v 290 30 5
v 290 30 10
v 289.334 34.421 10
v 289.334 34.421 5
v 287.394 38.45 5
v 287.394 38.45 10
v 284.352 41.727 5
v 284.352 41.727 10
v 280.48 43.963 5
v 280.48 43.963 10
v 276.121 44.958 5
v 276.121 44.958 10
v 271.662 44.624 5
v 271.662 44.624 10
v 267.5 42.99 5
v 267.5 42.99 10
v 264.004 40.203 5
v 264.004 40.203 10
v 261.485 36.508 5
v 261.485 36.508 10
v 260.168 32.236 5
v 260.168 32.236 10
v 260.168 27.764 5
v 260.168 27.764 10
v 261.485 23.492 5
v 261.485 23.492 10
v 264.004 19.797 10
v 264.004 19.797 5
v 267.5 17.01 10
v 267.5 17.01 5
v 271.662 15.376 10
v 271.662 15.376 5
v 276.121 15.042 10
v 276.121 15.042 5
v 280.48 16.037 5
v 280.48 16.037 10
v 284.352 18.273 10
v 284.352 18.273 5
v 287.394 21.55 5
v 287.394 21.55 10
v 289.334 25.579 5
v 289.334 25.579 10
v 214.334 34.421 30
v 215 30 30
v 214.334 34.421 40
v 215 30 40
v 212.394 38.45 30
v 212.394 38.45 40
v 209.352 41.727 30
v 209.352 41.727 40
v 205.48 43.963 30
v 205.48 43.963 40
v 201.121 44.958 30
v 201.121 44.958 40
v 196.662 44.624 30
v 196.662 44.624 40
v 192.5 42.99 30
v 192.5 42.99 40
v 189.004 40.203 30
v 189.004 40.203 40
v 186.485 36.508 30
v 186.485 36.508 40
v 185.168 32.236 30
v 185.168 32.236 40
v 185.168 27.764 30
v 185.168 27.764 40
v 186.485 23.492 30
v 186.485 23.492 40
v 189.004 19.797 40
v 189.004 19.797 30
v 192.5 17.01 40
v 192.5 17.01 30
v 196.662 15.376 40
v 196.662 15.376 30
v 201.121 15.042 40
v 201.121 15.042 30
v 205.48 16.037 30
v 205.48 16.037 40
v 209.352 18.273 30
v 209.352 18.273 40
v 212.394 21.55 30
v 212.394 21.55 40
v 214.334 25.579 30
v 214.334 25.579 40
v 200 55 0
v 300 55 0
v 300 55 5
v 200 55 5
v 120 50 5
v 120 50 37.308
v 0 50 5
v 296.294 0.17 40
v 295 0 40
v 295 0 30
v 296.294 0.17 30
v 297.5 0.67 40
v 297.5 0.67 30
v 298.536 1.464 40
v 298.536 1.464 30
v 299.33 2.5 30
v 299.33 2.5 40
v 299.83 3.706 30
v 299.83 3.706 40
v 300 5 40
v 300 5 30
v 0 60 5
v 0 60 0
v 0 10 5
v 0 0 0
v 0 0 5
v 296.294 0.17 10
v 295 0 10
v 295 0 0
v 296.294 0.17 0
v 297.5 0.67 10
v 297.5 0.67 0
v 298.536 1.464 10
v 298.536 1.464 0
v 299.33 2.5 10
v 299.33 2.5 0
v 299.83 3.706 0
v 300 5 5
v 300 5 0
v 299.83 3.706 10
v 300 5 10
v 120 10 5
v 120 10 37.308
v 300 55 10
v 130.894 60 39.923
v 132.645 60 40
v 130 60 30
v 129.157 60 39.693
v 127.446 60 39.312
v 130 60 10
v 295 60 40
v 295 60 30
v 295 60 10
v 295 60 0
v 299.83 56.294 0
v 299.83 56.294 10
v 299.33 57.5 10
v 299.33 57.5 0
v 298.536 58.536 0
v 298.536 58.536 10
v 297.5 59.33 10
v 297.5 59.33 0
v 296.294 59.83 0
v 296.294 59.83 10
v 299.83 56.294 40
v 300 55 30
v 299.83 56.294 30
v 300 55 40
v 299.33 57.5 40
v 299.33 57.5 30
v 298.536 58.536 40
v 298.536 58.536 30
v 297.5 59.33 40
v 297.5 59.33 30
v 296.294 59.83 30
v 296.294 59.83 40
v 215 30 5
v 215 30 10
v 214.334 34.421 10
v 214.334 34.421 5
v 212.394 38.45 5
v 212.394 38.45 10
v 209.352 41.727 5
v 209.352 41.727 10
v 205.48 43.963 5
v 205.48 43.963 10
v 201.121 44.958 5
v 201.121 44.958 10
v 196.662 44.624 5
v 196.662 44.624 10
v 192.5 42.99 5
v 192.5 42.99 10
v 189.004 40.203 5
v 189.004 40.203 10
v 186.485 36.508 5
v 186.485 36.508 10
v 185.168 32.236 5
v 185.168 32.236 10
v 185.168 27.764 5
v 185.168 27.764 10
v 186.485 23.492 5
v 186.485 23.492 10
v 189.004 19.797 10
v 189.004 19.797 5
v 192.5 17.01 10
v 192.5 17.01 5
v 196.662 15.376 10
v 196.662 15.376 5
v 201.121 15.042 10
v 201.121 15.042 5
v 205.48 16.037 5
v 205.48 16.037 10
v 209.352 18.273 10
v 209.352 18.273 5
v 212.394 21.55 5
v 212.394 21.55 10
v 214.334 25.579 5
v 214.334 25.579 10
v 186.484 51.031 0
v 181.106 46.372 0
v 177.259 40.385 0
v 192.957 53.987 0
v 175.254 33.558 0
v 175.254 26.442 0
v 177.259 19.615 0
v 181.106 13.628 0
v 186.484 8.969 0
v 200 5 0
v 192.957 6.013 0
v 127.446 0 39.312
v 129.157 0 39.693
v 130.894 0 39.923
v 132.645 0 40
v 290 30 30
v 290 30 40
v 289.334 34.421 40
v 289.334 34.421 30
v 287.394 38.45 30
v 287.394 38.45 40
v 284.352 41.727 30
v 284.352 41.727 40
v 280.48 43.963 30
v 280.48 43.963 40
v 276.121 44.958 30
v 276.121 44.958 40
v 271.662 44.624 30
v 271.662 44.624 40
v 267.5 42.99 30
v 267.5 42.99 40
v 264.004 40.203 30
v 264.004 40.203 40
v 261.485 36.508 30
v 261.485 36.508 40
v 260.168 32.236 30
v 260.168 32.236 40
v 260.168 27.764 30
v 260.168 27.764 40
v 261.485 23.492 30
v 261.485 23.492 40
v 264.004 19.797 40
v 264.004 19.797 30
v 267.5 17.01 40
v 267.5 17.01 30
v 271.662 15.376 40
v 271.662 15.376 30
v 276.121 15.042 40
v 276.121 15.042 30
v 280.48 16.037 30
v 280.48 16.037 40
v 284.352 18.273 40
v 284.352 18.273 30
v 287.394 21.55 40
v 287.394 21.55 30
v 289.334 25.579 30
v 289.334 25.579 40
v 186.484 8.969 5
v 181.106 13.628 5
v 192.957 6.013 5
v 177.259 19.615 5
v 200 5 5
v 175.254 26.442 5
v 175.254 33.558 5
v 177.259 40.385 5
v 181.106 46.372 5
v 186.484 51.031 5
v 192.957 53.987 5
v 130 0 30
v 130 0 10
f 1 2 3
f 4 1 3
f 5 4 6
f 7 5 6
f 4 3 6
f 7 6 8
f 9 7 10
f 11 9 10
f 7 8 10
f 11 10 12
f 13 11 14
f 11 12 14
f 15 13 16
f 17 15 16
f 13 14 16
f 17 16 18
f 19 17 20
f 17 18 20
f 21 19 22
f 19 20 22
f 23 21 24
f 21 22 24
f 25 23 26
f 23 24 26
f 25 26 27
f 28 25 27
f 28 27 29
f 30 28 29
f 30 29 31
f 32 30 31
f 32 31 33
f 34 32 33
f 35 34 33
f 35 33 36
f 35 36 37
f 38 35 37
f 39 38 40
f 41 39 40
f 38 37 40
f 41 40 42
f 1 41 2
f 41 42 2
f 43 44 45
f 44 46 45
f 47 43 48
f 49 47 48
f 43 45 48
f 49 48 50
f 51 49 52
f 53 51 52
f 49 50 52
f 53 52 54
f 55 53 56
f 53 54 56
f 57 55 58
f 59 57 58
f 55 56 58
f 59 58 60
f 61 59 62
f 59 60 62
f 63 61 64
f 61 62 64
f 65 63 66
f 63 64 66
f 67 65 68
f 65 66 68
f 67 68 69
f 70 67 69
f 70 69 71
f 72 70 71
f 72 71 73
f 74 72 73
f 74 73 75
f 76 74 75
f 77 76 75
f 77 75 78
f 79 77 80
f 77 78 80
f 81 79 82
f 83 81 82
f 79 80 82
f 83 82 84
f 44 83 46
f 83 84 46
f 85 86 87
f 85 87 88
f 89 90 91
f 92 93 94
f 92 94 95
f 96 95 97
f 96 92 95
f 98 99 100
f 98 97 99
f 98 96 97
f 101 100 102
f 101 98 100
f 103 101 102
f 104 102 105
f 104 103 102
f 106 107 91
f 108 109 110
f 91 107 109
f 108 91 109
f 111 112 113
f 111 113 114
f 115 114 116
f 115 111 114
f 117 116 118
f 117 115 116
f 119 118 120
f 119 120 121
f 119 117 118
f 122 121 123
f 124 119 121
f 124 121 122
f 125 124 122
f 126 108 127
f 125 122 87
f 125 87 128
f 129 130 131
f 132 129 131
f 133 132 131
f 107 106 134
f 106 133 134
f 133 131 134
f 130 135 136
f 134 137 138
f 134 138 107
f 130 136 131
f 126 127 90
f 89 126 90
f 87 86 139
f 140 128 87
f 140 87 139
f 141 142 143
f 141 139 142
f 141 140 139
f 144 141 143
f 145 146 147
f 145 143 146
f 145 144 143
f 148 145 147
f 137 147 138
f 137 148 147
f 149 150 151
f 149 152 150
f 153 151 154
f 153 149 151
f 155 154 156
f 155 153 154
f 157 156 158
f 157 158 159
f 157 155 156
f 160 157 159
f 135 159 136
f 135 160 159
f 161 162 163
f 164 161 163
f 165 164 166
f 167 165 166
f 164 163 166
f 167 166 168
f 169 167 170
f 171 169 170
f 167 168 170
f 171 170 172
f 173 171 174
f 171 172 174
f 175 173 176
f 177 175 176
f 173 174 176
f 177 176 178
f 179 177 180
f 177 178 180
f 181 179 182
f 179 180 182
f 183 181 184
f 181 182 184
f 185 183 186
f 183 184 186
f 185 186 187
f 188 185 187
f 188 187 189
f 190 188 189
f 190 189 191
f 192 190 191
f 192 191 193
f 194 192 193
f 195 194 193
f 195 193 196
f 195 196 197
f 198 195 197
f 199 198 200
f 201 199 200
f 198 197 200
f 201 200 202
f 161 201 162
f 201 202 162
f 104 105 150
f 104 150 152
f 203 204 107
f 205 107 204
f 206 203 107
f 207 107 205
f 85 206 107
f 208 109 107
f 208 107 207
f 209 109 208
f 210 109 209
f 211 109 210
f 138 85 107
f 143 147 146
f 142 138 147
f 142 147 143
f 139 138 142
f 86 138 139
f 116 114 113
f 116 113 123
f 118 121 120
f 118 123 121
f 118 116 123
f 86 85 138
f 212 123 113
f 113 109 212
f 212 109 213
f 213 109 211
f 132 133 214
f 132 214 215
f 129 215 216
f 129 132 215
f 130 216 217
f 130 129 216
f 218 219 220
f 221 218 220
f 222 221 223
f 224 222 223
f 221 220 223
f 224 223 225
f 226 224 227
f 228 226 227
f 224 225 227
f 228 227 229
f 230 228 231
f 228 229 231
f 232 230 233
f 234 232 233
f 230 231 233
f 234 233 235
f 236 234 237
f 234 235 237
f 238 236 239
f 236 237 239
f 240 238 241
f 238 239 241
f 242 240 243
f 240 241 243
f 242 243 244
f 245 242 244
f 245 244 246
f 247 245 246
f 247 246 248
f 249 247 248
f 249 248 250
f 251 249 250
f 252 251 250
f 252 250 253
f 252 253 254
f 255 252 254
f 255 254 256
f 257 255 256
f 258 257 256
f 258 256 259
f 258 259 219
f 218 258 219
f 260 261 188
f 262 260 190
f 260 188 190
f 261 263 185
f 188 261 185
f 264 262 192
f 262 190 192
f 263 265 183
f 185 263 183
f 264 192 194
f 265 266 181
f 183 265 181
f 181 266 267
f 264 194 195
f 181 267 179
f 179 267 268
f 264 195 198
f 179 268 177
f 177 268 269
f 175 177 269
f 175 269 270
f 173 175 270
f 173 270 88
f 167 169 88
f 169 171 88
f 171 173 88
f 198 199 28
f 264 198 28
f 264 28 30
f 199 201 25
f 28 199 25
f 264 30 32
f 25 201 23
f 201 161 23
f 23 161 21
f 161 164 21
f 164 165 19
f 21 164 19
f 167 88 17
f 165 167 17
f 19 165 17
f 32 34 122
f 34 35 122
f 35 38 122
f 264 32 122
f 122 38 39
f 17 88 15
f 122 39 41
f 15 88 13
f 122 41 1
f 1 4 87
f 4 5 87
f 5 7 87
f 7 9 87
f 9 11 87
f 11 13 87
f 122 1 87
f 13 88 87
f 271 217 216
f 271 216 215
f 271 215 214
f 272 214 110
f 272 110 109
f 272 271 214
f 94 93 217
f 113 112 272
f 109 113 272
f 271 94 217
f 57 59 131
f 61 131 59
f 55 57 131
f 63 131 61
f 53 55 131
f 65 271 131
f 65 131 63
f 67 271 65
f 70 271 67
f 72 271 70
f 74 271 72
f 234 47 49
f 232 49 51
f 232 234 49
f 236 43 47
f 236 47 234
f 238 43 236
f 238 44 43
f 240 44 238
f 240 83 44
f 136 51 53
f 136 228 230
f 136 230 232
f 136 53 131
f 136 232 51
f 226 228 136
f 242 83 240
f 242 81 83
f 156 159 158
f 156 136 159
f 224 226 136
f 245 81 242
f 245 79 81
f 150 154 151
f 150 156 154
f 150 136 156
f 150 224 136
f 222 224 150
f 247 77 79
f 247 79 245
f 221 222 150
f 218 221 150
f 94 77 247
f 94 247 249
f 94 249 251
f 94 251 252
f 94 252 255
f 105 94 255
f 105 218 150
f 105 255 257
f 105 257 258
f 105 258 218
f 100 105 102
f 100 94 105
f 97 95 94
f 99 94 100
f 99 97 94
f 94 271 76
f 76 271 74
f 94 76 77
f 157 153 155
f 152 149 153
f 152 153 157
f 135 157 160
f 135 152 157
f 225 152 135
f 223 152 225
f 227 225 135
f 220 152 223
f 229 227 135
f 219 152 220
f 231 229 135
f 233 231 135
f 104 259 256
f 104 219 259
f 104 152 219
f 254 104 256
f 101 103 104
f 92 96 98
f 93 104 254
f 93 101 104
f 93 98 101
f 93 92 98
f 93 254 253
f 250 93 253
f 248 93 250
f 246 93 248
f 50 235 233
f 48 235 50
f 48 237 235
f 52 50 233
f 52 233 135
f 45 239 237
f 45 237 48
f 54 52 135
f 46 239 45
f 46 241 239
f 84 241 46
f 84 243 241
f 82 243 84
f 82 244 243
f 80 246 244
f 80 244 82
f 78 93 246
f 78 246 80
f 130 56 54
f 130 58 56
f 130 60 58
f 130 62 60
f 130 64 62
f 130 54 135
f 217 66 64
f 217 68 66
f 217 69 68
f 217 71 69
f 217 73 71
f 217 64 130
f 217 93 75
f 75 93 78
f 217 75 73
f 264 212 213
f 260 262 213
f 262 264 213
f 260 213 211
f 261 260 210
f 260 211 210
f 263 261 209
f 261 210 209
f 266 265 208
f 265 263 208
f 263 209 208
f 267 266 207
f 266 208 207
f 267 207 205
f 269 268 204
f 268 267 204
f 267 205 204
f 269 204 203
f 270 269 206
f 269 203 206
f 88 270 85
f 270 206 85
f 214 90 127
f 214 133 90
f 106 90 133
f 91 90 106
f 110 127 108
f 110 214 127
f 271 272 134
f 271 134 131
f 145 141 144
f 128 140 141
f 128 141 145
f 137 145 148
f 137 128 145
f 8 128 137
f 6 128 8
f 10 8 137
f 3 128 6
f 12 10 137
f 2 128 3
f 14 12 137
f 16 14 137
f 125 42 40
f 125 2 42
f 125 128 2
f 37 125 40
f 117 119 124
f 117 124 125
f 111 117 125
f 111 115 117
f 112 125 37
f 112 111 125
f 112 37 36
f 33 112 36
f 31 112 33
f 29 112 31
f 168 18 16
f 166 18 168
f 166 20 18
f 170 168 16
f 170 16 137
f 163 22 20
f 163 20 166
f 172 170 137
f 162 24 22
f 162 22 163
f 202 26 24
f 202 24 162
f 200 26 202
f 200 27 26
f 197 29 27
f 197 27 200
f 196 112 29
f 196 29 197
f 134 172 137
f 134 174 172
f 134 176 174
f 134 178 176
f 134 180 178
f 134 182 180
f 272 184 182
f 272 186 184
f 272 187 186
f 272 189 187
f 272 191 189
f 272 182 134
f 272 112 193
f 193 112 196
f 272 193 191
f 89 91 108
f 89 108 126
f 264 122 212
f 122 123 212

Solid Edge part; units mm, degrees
sketch "Sketch1" plane through (0, 0, 0) normal (0, -1, 0) x (1, 0, 0)
  line L0 (300, 40) -> (130, 40)
  line L1 (130, 40) -> (0, 5)
  line L2 (0, 0) -> (0, 5)
  line L3 (0, 0) -> (300, 0)
  line L4 (300, 0) -> (300, 10)
  line L5 (300, 10) -> (130, 10)
  line L6 (130, 10) -> (130, 30)
  line L7 (130, 30) -> (300, 30)
  line L8 (300, 30) -> (300, 40)
extrude "Protrusion1" add sketch "Sketch1" against normal blind 60
sketch "Sketch2" plane through (459.6291, 50, 40) normal (0, 0, 1) x (1, 0, 0)
  circle A0 centre (-259.6291, -20) radius 15
  circle A1 centre (-184.6291, -20) radius 15
  dimension "D1" = 30
  dimension "D2" = 75
  dimension "D3" = 30
  dimension "D4" = 60
  dimension "D5" = 25
extrude "Cutout1" cut sketch "Sketch2" against normal through all
sketch "Sketch3" plane through (459.6291, 50, 40) normal (0, 0, 1) x (0, 1, 0)
  line L0 (-40, 339.6291) -> (0, 339.6291)
  line L1 (0, 339.6291) -> (0, 459.6291)
  line L2 (0, 459.6291) -> (-40, 459.6291)
  line L3 (-40, 459.6291) -> (-40, 339.6291)
  dimension "D1" = 120
  dimension "D2" = 40
  dimension "D3" = 10
  dimension "D4" = 10
extrude "ExtrudedCutout_2" cut sketch "Sketch3" against normal blind 35
fillet "Round_1" radius 5 4 edges at (300, 0, 5) (300, 60, 5) (300, 60, 35) (300, 0, 35)
fillet "Round_2" radius 20 1 edges at (130, 30, 40)
sketch "Sketch4" plane through (150, 40, 0) normal (0, 0, -1) x (1, 0, 0)
  line L0 (150, -15) -> (50, -15)
  line L1 (150, 35) -> (50, 35)
  line L2 (150, 35) -> (150, -15)
  arc A0 (50, -15) -> (50, 35) centre (50, 10) cw
  dimension "D1" = 150
  dimension "D2" = 150
extrude "ExtrudedCutout_3" cut sketch "Sketch4" against normal blind 5
